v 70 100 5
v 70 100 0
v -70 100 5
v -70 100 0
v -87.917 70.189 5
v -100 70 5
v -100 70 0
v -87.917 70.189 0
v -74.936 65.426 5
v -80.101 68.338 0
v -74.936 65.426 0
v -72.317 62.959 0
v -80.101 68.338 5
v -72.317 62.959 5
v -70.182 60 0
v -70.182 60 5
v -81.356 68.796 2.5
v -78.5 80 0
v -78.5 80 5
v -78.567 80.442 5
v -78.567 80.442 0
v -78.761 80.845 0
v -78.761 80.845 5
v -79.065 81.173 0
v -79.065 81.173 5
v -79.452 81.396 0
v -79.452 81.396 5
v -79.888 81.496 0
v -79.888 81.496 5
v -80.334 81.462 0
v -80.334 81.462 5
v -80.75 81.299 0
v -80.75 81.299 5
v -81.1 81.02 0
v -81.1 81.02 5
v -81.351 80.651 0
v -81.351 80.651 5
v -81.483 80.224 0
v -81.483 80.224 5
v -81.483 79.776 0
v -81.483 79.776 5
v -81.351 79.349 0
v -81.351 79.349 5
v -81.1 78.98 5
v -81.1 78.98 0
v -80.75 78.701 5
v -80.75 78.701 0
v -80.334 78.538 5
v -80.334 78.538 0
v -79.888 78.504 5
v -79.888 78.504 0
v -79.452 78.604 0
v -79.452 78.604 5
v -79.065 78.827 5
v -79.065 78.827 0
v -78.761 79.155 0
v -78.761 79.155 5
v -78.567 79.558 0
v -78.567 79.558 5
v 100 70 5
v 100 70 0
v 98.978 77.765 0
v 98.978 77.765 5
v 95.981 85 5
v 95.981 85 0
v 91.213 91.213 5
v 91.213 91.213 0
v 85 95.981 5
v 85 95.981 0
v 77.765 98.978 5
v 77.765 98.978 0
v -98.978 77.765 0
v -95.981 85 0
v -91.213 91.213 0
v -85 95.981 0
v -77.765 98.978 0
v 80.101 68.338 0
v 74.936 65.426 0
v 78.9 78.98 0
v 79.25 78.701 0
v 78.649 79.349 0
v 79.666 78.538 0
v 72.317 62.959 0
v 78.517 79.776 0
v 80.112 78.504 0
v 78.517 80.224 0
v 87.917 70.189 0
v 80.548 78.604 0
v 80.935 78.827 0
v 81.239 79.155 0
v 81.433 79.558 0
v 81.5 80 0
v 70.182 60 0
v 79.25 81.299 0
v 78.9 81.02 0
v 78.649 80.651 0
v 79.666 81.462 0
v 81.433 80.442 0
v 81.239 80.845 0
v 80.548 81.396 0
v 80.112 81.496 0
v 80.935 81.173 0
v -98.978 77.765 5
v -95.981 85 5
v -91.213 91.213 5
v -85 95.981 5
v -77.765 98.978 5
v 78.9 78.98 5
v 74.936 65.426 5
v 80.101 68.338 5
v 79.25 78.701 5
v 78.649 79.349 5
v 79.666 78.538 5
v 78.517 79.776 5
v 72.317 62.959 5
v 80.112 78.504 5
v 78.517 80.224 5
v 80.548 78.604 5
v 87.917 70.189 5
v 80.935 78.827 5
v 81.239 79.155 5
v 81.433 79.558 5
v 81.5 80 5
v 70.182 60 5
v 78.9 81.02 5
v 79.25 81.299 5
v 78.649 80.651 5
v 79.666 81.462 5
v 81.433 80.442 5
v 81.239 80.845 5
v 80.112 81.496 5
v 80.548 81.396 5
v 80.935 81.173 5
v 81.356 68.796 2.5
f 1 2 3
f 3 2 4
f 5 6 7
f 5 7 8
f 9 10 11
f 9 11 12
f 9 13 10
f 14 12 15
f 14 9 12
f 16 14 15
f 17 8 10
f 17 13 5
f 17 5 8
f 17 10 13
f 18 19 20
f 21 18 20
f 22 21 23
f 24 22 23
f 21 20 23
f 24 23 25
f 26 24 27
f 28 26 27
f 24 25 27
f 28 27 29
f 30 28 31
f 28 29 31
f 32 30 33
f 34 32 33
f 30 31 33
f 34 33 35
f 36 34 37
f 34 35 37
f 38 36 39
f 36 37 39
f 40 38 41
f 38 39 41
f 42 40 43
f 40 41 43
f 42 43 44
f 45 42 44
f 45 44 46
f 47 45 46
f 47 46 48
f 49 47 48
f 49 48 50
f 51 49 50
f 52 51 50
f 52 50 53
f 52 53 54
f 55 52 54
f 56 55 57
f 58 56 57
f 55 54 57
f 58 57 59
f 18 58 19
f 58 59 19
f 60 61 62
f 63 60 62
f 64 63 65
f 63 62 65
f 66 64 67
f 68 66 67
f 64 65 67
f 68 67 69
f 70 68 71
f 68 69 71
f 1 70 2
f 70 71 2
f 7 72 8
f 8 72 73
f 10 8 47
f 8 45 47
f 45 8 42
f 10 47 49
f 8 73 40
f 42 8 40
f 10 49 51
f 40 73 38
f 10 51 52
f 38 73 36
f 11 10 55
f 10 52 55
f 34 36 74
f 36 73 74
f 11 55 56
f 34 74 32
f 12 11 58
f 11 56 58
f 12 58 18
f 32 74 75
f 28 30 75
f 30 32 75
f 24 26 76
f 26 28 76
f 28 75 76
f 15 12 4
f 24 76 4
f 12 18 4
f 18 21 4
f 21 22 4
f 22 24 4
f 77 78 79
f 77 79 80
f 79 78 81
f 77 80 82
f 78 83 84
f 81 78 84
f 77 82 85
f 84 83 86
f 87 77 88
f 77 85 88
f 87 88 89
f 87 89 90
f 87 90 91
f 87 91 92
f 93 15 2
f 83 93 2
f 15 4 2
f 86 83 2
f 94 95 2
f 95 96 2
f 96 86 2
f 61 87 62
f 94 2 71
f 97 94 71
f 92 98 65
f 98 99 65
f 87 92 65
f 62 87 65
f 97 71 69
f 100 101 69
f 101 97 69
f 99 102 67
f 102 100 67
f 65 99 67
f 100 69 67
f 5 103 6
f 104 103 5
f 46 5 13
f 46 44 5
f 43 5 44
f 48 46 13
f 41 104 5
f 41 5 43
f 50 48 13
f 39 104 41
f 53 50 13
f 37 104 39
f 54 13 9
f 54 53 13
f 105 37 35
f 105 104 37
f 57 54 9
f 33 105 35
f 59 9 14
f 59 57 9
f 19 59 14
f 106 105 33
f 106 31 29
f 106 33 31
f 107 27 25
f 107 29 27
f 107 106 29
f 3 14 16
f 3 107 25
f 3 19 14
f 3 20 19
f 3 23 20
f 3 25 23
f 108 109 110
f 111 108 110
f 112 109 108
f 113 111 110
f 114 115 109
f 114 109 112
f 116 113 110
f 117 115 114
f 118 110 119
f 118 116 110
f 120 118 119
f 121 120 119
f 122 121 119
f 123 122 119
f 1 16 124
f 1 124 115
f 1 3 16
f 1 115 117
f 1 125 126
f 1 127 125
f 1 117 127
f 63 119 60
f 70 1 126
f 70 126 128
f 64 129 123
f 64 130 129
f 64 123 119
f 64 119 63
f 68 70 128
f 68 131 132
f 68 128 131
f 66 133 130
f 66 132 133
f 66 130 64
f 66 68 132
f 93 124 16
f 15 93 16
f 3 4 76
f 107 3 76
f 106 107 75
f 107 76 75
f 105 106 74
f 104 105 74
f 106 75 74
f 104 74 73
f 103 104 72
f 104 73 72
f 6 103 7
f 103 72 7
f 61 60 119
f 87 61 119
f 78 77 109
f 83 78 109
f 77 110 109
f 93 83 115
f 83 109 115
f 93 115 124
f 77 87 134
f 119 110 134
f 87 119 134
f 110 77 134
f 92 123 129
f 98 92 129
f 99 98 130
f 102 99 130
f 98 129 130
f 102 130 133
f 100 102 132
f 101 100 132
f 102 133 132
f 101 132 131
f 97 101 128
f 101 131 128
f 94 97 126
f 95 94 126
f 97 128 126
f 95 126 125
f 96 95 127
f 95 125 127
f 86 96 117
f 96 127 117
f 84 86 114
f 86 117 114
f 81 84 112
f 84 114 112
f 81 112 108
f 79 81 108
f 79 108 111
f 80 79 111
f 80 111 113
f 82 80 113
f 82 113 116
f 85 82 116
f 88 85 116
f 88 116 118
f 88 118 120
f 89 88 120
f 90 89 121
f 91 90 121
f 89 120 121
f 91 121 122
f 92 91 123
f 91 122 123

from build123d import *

# Parameters (mm, degrees)
BOSS_EXTRUDE1_DEPTH = 5
SKETCH2_W           = 30
SKETCH2_H           = 70
CUT_EXTRUDE1_DEPTH  = 5
CUT_EXTRUDE2_DEPTH  = 5
SKETCH5_R           = 2.5
CUT_EXTRUDE3_DEPTH  = 5
SKETCH6_R           = 2.5
CUT_EXTRUDE4_DEPTH  = 5
CUT_EXTRUDE5_DEPTH  = 5
SKETCH8_R           = 1.5
CUT_EXTRUDE6_DEPTH  = 5


with BuildPart() as part:
    # Sketch1 → Boss-Extrude1 (new body)
    with BuildSketch(Plane.XY):
        with BuildLine():
            Line((-90, -100), (90, -100))
            ThreePointArc((90, -100), (97.071067812, -97.071067812), (100, -90))
            Line((100, -90), (100, 70))
            ThreePointArc((100, 70), (91.213203436, 91.213203436), (70, 100))
            Line((70, 100), (-70, 100))
            ThreePointArc((-70, 100), (-91.213203436, 91.213203436), (-100, 70))
            Line((-100, 70), (-100, -90))
            ThreePointArc((-100, -90), (-97.071067812, -97.071067812), (-90, -100))
        make_face()
    extrude(amount=BOSS_EXTRUDE1_DEPTH)

    # Sketch2 → Cut-Extrude1 (cut)
    with BuildSketch(Plane.XY.offset(5)):
        with Locations((85, -55)):
            Rectangle(SKETCH2_W, SKETCH2_H)
        with Locations((-85, -55)):
            Rectangle(SKETCH2_W, SKETCH2_H)
    extrude(amount=-CUT_EXTRUDE1_DEPTH, mode=Mode.SUBTRACT)

    # Sketch3 → Cut-Extrude2 (cut)
    with BuildSketch(Plane.XY.offset(5)):
        with BuildLine():
            Line((85, -20), (100, -20))
            Line((100, -20), (100, 70))
            add(Edge.make_bspline(
                [(100, 70), (41.562750789, 76.769648156), (85, -20)],
                knots=[0, 0, 0, 1, 1, 1], degree=2))
        make_face()
        with BuildLine():
            Line((-85, -20), (-100, -20))
            Line((-100, -20), (-100, 70))
            add(Edge.make_bspline(
                [(-100, 70), (-41.562750789, 76.769648156), (-85, -20)],
                knots=[0, 0, 0, 1, 1, 1], degree=2))
        make_face()
    extrude(amount=-CUT_EXTRUDE2_DEPTH, mode=Mode.SUBTRACT)

    # Sketch5 → Cut-Extrude3 (cut)
    with BuildSketch(Plane.XY.offset(5)):
        with Locations((50, -80)):
            Circle(SKETCH5_R)
        with Locations((-50, -80)):
            Circle(SKETCH5_R)
        with Locations(Location((50, -20, 0), (0, 0, 180))):
            Circle(SKETCH5_R)
        with Locations(Location((-50, -20, 0), (0, 0, 180))):
            Circle(SKETCH5_R)
    extrude(amount=-CUT_EXTRUDE3_DEPTH, mode=Mode.SUBTRACT)

    # Sketch6 → Cut-Extrude4 (cut)
    with BuildSketch(Plane.XY.offset(5)):
        with Locations((0, -90)):
            Circle(SKETCH6_R)
    extrude(amount=-CUT_EXTRUDE4_DEPTH, mode=Mode.SUBTRACT)

    # Sketch7 → Cut-Extrude5 (cut)
    with BuildSketch(Plane.XY.offset(5)):
        Polygon((-70.182426877, 60), (70.182426877, 60), (160.134720298, 60), (160.134720298, -117.07554651), (-141.914902021, -117.07554651), (-141.914902021, 60), align=None)
    extrude(amount=-CUT_EXTRUDE5_DEPTH, mode=Mode.SUBTRACT)

    # Sketch8 → Cut-Extrude6 (cut)
    with BuildSketch(Plane.XY.offset(5)):
        with Locations((-80, 80)):
            Circle(SKETCH8_R)
        with Locations((80, 80)):
            Circle(SKETCH8_R)
    extrude(amount=-CUT_EXTRUDE6_DEPTH, mode=Mode.SUBTRACT)


solid = part.part
